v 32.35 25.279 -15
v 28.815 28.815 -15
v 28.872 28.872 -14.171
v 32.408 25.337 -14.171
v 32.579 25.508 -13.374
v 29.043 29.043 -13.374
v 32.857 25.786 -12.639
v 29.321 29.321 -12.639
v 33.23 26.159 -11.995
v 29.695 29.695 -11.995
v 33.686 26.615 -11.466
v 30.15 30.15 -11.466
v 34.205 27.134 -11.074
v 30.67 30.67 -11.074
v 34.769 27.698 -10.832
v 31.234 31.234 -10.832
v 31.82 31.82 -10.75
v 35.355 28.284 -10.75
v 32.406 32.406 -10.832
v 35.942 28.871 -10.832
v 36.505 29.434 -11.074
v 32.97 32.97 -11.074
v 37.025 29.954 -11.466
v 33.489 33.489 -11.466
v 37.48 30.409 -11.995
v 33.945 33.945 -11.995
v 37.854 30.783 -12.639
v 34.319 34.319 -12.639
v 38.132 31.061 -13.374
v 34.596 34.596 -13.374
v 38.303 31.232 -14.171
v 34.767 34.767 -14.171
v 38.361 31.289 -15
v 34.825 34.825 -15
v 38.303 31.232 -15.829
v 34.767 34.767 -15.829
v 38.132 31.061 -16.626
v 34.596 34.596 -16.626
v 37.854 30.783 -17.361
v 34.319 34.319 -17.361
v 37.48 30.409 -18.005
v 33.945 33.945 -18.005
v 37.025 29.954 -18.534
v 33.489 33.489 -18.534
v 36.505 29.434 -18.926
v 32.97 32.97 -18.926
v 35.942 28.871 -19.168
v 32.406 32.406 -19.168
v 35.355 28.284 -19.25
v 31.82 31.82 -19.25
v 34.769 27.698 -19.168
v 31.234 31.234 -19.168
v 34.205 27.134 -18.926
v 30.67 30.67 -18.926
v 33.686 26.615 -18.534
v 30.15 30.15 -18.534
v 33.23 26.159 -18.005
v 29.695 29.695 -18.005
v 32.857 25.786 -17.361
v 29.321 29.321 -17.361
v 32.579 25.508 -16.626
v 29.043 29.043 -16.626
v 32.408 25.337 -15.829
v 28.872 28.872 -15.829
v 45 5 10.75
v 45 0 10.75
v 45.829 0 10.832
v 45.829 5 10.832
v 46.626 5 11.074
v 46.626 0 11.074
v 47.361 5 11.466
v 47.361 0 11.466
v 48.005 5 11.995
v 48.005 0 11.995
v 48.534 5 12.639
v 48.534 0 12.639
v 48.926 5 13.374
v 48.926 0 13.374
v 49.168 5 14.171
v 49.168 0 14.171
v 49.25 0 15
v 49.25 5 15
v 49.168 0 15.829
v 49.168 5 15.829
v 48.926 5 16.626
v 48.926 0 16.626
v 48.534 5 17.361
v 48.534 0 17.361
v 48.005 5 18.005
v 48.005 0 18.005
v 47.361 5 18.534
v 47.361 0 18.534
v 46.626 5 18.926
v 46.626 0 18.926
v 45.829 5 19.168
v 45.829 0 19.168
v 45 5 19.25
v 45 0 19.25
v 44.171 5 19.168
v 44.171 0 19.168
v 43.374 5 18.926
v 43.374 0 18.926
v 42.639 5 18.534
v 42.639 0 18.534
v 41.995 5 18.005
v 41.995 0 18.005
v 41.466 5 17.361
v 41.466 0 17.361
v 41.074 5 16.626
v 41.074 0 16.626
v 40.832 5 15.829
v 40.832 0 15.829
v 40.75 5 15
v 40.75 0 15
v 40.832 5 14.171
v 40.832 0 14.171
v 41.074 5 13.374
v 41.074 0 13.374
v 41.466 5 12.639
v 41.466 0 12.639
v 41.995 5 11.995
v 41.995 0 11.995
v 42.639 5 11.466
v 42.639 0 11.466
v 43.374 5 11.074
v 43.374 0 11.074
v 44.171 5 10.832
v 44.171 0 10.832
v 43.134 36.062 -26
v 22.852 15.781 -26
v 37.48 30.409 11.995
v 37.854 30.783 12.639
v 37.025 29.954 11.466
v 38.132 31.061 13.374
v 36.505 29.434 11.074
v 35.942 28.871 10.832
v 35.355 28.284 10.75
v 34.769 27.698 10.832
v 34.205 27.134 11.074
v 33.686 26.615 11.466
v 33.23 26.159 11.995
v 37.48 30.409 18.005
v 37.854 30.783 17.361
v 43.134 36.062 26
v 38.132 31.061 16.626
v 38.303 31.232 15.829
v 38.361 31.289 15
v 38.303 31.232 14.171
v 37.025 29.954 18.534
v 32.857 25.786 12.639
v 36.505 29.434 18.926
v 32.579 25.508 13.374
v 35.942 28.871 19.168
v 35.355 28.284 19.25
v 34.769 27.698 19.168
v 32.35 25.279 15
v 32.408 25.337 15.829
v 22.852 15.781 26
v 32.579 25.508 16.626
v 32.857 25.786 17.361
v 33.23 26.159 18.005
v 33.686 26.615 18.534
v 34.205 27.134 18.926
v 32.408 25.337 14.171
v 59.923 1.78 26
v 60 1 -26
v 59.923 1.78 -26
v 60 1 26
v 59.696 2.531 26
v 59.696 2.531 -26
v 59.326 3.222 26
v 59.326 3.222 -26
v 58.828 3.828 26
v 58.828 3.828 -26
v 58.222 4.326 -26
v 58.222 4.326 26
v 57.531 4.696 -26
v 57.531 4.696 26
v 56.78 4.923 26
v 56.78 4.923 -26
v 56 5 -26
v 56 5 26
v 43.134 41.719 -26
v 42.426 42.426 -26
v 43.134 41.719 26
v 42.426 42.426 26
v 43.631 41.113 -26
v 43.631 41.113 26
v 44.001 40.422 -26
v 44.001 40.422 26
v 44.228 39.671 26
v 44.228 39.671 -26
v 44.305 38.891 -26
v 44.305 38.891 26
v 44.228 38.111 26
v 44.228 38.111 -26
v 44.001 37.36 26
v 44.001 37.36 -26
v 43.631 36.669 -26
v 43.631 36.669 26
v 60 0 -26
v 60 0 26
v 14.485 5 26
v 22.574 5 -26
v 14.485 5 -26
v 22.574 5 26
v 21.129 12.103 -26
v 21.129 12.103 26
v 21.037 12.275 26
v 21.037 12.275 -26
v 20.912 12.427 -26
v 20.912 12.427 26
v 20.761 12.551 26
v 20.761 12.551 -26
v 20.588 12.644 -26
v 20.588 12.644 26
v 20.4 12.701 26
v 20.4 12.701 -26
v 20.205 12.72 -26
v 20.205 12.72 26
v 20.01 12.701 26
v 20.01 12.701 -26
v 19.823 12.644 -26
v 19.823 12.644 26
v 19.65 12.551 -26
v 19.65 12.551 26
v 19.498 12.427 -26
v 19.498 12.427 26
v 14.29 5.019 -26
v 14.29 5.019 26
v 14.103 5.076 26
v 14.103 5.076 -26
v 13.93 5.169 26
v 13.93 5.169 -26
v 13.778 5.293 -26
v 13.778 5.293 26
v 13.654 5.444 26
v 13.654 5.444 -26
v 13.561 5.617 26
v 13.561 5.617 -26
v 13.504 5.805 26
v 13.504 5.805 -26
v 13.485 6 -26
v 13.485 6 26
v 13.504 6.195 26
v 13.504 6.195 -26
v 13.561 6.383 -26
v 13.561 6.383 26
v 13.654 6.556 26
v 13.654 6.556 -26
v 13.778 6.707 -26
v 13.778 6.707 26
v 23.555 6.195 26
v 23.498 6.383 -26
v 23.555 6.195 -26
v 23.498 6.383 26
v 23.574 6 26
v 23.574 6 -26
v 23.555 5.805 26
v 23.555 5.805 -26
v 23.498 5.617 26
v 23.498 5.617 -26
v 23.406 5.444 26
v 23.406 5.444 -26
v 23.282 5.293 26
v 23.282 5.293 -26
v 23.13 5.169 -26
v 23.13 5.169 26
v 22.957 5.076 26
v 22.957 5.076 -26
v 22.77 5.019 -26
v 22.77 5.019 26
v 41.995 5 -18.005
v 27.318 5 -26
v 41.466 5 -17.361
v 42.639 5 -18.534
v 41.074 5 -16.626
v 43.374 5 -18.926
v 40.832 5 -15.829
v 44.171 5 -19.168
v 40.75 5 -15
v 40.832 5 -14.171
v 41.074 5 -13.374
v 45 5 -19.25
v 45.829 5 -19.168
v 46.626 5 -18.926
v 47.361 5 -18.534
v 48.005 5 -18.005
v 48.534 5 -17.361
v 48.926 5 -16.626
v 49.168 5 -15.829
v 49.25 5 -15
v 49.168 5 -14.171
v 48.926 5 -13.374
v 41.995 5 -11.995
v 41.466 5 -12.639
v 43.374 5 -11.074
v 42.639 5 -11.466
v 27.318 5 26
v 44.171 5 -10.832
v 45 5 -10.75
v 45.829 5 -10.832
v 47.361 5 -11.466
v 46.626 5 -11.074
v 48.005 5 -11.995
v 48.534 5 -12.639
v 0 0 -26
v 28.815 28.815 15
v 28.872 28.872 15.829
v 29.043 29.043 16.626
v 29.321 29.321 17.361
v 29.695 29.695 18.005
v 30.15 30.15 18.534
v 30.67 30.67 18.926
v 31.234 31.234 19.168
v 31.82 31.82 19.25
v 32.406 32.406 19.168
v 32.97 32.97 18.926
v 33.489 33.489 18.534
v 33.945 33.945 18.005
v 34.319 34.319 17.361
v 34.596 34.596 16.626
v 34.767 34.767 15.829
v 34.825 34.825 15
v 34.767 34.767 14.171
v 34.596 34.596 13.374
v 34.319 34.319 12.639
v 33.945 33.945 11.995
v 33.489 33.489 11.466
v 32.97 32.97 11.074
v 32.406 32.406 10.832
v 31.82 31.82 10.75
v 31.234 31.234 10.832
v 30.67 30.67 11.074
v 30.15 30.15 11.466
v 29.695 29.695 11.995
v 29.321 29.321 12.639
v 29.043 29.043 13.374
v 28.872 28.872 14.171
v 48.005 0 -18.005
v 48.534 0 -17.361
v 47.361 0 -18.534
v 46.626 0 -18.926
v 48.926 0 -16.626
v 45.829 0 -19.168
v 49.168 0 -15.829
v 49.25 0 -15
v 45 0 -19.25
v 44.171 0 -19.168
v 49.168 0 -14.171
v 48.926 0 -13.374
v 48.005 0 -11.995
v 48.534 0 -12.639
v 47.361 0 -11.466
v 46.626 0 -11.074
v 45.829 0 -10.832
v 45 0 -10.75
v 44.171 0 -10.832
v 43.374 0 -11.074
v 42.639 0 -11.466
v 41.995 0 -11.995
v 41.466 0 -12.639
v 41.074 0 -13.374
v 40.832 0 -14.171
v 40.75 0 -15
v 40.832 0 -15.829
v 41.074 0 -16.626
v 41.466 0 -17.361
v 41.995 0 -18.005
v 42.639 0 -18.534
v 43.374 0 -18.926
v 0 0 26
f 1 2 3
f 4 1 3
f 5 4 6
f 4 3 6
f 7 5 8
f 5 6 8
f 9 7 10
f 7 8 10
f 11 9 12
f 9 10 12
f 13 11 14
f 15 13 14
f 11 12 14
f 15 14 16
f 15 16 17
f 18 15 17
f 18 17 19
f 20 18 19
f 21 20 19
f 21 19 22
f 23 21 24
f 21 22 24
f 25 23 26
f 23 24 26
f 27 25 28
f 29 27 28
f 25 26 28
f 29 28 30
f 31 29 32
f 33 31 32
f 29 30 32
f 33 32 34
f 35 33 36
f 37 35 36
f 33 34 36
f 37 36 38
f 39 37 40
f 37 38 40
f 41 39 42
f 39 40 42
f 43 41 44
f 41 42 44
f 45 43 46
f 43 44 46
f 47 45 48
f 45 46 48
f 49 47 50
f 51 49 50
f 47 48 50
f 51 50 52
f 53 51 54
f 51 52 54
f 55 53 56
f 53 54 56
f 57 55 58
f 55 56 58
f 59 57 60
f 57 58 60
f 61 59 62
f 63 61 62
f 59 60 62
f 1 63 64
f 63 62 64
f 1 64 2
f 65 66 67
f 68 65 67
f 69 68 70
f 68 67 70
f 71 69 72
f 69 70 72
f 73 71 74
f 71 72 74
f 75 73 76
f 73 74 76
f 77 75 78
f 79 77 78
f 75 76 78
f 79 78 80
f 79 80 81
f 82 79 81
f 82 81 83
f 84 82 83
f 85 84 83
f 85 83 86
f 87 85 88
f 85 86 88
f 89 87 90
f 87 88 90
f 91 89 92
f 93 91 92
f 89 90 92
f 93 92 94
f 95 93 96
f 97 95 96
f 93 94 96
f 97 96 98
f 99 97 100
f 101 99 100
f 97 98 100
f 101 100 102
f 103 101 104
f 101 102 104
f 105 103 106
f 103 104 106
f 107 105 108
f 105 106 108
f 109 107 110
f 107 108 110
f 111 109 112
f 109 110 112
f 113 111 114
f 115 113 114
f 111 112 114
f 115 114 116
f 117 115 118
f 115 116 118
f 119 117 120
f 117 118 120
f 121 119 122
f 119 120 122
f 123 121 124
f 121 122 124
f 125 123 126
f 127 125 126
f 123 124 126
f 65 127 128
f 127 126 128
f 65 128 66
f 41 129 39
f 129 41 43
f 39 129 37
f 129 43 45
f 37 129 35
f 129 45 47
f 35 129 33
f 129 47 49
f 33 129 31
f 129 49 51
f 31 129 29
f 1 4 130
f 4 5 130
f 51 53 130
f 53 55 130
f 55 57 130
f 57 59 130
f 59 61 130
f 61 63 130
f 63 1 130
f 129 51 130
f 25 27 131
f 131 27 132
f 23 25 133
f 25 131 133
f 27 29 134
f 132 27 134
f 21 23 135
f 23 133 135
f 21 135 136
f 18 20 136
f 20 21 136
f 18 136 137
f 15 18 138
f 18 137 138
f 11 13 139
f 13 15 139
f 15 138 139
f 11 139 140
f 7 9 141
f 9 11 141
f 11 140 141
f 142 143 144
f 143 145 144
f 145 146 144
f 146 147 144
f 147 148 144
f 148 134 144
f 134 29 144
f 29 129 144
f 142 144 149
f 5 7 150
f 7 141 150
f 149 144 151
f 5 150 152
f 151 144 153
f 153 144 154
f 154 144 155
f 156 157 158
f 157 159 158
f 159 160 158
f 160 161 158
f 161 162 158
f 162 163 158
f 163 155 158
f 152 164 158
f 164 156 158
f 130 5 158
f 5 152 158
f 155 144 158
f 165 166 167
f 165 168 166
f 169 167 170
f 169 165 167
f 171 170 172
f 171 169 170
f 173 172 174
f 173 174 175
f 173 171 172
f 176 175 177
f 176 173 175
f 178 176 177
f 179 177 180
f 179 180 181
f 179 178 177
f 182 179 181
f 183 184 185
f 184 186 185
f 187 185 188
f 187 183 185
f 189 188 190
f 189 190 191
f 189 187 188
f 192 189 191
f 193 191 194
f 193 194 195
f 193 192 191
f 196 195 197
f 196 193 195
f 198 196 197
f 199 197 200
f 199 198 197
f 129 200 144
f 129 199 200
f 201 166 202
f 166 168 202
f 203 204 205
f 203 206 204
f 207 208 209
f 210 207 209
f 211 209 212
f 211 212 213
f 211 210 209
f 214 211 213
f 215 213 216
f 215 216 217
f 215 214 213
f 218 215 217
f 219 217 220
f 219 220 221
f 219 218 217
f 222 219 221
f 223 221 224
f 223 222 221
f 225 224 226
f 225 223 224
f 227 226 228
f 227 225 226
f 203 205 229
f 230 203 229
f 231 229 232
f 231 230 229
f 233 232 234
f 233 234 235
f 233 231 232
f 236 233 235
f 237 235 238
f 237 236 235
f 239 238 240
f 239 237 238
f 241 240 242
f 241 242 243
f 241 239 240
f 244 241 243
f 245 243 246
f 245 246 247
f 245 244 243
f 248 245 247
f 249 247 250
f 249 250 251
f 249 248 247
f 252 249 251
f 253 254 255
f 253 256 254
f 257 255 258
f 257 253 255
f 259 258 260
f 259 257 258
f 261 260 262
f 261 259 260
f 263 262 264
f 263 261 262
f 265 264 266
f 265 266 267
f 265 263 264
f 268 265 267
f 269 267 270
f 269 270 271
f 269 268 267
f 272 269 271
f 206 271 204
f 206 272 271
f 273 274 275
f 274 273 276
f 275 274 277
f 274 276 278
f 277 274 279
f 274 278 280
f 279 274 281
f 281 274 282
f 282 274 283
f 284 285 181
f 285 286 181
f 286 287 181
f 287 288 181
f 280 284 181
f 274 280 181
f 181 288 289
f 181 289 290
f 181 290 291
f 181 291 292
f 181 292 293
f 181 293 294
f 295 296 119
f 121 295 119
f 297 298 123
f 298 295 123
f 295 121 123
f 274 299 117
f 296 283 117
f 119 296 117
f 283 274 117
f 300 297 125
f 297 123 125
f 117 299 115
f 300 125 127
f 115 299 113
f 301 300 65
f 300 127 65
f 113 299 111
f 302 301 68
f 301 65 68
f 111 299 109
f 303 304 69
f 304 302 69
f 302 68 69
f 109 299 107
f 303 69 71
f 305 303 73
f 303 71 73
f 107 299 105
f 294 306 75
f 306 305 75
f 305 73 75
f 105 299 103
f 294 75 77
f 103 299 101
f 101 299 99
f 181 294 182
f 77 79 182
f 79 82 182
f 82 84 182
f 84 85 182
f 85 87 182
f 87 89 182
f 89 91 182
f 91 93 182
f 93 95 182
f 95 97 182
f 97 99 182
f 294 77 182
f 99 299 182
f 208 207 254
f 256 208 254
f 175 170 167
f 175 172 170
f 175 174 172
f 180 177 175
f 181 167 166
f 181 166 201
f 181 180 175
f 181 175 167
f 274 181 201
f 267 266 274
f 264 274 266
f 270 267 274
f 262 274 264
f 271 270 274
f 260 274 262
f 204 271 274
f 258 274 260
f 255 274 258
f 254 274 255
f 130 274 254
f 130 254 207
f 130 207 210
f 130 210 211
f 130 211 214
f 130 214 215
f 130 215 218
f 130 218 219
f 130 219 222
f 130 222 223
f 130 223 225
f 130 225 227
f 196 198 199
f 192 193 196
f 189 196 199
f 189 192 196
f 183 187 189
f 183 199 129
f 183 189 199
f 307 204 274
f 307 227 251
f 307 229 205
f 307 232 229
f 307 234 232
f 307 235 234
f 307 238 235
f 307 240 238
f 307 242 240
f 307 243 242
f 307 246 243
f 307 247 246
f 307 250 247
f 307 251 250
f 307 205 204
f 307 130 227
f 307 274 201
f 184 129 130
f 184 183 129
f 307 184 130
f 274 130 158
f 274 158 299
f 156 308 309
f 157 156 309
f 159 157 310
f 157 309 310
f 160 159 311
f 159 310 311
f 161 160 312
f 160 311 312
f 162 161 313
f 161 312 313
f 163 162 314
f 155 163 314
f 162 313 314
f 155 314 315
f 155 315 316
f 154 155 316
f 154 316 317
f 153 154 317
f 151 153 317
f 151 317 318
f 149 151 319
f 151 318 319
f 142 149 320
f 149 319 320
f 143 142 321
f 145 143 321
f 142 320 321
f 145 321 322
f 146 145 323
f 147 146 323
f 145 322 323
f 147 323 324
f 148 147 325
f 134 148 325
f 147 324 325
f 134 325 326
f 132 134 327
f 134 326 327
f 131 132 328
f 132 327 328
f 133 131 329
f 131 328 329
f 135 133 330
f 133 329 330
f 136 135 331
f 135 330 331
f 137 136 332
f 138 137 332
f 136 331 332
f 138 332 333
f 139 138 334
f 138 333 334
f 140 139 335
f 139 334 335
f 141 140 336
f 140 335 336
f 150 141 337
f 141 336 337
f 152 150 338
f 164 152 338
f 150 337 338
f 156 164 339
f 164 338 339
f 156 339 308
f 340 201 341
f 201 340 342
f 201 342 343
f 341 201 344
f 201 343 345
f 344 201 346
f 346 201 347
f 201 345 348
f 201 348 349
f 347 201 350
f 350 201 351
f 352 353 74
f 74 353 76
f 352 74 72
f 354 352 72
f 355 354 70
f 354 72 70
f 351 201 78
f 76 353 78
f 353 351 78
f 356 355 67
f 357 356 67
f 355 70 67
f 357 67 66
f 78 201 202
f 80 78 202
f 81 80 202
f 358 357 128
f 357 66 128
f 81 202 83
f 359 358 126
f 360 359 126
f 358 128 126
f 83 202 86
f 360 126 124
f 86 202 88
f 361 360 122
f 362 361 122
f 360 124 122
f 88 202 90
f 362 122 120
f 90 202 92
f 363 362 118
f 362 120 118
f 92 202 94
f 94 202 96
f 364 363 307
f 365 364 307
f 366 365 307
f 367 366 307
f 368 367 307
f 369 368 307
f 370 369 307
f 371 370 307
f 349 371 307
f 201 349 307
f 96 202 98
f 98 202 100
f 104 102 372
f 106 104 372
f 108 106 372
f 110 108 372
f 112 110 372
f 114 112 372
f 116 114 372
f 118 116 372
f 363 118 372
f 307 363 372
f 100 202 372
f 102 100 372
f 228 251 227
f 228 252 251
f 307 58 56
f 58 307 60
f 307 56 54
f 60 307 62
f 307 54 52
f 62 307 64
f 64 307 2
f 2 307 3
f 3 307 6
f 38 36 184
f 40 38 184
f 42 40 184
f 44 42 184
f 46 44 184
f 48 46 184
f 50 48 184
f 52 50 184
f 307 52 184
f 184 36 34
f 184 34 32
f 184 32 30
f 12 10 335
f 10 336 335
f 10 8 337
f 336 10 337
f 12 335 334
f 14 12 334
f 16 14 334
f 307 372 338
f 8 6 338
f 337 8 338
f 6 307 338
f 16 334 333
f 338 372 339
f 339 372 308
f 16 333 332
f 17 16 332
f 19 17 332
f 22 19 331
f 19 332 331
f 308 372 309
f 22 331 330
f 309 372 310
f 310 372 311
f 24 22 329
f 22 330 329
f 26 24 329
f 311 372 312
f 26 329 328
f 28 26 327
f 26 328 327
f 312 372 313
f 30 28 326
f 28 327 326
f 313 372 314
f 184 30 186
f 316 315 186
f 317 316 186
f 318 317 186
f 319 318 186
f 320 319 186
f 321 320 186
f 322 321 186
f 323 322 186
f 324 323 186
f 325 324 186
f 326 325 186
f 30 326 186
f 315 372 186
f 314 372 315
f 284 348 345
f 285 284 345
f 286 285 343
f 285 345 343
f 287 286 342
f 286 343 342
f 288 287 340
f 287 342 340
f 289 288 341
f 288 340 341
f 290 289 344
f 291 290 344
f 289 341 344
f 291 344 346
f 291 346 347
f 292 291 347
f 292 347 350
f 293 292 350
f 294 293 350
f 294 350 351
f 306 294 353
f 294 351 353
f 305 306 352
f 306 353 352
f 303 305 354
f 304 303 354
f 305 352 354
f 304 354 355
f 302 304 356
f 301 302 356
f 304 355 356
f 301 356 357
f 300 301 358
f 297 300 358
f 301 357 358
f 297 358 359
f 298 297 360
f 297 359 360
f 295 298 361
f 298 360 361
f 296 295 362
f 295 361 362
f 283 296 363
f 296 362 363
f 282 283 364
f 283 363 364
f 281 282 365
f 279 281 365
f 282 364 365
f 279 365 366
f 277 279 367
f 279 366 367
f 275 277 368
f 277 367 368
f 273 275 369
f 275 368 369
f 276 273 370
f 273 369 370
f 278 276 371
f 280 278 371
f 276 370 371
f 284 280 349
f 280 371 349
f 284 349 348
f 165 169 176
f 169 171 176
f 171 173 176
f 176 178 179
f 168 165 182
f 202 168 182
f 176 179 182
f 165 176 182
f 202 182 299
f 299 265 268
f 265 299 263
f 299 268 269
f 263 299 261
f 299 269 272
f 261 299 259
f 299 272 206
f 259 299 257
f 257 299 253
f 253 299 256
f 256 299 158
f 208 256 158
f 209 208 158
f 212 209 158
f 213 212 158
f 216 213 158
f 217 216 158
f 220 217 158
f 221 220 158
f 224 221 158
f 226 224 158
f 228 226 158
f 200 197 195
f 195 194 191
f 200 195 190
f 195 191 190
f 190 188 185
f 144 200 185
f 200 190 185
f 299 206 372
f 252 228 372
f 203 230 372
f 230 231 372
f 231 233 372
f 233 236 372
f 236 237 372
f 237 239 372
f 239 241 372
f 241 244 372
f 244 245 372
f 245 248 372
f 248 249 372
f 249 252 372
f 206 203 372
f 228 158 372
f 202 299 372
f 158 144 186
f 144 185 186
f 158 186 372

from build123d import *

# Parameters (mm, degrees)
EXTRUDE_1_DEPTH     = 26
SKETCH_2_R          = 4.25
CUT_EXTRUDE_1_DEPTH = 5
SKETCH_3_R          = 4.25
CUT_EXTRUDE_2_DEPTH = 5
FILLET_1_R          = 4
FILLET_2_R          = 1


with BuildPart() as part:
    # Эскиз1 → Бобышка-Вытянуть1 (new body, symmetric)
    with BuildSketch(Plane.XY):
        Polygon((0, 0), (42.426406871, 42.426406871), (45.961940777, 38.890872965), (22.85244978, 15.781381968), (27.318244413, 5), (60, 5), (60, 0), align=None)
        Polygon((20.556349186, 13.485281374), (24.071067812, 5), (12.071067812, 5), align=None, mode=Mode.SUBTRACT)
    extrude(amount=EXTRUDE_1_DEPTH, both=True)

    # Эскиз2 → Вырез-Вытянуть1 (cut)
    with BuildSketch(Plane(origin=(0, 0, 0), x_dir=(0, 0, 1), z_dir=(-0.707106781, 0.707106781, 0))):
        with Locations(Location((-15, 45, 0), (0, 0, 270))):  # turned: the seam where the file's is
            Circle(SKETCH_2_R)
        with Locations(Location((15, 45, 0), (0, 0, 270))):  # turned: the seam where the file's is
            Circle(SKETCH_2_R)
    extrude(amount=-CUT_EXTRUDE_1_DEPTH, mode=Mode.SUBTRACT)

    # Эскиз3 → Вырез-Вытянуть2 (cut)
    with BuildSketch(Plane.XZ):
        with Locations(Location((45, 15, 0), (0, 0, 270))):  # turned: the seam where the file's is
            Circle(SKETCH_3_R)
        with Locations(Location((45, -15, 0), (0, 0, 270))):  # turned: the seam where the file's is
            Circle(SKETCH_3_R)
    extrude(amount=-CUT_EXTRUDE_2_DEPTH, mode=Mode.SUBTRACT)

    # Скругление1
    fillet_1_edges = [part.edges().sort_by_distance(p)[0] for p in [
        (45.961940777, 38.890872965, 0),
        (60, 5, 0),
    ]]
    fillet(fillet_1_edges, radius=FILLET_1_R)

    # Скругление2
    fillet_2_edges = [part.edges().sort_by_distance(p)[0] for p in [
        (20.556349186, 13.485281374, 0),
        (12.071067812, 5, 0),
        (24.071067812, 5, 0),
    ]]
    fillet(fillet_2_edges, radius=FILLET_2_R)


solid = part.part
